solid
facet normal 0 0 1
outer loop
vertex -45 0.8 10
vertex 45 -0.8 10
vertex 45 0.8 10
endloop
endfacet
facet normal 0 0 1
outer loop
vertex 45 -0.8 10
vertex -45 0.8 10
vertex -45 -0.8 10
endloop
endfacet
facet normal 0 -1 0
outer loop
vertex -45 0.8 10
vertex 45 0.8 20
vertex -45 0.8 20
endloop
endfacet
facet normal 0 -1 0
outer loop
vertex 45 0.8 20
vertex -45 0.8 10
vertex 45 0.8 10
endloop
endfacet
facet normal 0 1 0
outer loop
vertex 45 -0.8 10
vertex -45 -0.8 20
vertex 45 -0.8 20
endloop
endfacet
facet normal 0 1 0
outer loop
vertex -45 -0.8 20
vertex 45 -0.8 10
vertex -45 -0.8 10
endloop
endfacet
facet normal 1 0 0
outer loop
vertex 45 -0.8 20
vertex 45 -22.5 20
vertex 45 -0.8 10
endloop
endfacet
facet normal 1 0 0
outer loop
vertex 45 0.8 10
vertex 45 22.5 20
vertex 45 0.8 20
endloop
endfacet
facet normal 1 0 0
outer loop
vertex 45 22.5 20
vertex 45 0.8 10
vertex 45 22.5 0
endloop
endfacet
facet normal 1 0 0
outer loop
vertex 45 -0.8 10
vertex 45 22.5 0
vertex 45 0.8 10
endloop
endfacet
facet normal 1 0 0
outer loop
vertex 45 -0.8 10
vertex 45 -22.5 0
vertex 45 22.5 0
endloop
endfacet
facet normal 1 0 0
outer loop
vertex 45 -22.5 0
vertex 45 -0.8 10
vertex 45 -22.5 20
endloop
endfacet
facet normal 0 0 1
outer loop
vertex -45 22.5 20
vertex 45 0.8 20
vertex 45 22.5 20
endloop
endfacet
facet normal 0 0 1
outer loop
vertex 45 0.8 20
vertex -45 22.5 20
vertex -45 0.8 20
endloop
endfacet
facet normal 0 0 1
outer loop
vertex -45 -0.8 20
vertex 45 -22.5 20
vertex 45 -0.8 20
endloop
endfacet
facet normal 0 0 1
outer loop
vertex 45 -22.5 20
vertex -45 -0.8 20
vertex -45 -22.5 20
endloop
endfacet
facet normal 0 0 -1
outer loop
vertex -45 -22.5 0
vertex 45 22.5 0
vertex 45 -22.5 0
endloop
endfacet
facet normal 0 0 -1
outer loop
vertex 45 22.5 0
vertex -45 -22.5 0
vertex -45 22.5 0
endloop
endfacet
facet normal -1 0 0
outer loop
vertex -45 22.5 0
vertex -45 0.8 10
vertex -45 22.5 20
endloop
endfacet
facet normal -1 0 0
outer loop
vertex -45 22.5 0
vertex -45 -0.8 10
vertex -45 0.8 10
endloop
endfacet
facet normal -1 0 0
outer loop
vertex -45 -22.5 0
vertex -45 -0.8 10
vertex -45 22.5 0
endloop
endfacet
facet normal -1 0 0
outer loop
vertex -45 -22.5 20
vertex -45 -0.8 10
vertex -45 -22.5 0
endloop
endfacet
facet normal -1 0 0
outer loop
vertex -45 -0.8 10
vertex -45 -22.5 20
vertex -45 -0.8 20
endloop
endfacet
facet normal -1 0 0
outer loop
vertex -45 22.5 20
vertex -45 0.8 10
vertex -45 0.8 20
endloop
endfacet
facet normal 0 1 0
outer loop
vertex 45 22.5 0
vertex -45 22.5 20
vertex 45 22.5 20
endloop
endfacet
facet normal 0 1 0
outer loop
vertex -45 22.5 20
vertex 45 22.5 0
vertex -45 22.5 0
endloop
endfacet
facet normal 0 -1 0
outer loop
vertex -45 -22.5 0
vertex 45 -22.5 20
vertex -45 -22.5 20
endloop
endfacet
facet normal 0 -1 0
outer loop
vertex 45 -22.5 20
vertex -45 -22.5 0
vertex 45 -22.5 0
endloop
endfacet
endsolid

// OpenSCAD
// Microscope slide drying rack
// Print orientation: base block on the bed (z = 0), slots open upward.

// ---------------- Parameters ----------------
block_len    = 90;    // base block length along X (mm)
block_wid    = 45;    // base block width along Y (mm)
block_h      = 20;    // base block height along Z (mm)

slot_count   = 10;    // number of slide slots
slot_len     = 77;    // slot length along X (mm)
slot_w       = 1.6;   // slot width along Y (mm)
slot_depth   = 10;    // slot depth from top face (mm)
slot_pitch   = 3.5;   // centre-to-centre slot spacing along Y (mm)

eps          = 0.5;   // overshoot of cutters past the top face (mm)

$fn = 64;

// ---------------- Model ----------------
difference() {
    // Base block, centred in X and Y, sitting on z = 0
    translate([-block_len / 2, -block_wid / 2, 0])
        cube([block_len, block_wid, block_h]);

    // Parallel slots, centred as a group in X and Y
    for (i = [0 : slot_count - 1]) {
        x = (i - (slot_count - 1) / 2) * slot_pitch;
        translate([x - slot_len / 2, -slot_w / 2, block_h - slot_depth])
            cube([slot_len, slot_w, slot_depth + eps]);
    }
}
